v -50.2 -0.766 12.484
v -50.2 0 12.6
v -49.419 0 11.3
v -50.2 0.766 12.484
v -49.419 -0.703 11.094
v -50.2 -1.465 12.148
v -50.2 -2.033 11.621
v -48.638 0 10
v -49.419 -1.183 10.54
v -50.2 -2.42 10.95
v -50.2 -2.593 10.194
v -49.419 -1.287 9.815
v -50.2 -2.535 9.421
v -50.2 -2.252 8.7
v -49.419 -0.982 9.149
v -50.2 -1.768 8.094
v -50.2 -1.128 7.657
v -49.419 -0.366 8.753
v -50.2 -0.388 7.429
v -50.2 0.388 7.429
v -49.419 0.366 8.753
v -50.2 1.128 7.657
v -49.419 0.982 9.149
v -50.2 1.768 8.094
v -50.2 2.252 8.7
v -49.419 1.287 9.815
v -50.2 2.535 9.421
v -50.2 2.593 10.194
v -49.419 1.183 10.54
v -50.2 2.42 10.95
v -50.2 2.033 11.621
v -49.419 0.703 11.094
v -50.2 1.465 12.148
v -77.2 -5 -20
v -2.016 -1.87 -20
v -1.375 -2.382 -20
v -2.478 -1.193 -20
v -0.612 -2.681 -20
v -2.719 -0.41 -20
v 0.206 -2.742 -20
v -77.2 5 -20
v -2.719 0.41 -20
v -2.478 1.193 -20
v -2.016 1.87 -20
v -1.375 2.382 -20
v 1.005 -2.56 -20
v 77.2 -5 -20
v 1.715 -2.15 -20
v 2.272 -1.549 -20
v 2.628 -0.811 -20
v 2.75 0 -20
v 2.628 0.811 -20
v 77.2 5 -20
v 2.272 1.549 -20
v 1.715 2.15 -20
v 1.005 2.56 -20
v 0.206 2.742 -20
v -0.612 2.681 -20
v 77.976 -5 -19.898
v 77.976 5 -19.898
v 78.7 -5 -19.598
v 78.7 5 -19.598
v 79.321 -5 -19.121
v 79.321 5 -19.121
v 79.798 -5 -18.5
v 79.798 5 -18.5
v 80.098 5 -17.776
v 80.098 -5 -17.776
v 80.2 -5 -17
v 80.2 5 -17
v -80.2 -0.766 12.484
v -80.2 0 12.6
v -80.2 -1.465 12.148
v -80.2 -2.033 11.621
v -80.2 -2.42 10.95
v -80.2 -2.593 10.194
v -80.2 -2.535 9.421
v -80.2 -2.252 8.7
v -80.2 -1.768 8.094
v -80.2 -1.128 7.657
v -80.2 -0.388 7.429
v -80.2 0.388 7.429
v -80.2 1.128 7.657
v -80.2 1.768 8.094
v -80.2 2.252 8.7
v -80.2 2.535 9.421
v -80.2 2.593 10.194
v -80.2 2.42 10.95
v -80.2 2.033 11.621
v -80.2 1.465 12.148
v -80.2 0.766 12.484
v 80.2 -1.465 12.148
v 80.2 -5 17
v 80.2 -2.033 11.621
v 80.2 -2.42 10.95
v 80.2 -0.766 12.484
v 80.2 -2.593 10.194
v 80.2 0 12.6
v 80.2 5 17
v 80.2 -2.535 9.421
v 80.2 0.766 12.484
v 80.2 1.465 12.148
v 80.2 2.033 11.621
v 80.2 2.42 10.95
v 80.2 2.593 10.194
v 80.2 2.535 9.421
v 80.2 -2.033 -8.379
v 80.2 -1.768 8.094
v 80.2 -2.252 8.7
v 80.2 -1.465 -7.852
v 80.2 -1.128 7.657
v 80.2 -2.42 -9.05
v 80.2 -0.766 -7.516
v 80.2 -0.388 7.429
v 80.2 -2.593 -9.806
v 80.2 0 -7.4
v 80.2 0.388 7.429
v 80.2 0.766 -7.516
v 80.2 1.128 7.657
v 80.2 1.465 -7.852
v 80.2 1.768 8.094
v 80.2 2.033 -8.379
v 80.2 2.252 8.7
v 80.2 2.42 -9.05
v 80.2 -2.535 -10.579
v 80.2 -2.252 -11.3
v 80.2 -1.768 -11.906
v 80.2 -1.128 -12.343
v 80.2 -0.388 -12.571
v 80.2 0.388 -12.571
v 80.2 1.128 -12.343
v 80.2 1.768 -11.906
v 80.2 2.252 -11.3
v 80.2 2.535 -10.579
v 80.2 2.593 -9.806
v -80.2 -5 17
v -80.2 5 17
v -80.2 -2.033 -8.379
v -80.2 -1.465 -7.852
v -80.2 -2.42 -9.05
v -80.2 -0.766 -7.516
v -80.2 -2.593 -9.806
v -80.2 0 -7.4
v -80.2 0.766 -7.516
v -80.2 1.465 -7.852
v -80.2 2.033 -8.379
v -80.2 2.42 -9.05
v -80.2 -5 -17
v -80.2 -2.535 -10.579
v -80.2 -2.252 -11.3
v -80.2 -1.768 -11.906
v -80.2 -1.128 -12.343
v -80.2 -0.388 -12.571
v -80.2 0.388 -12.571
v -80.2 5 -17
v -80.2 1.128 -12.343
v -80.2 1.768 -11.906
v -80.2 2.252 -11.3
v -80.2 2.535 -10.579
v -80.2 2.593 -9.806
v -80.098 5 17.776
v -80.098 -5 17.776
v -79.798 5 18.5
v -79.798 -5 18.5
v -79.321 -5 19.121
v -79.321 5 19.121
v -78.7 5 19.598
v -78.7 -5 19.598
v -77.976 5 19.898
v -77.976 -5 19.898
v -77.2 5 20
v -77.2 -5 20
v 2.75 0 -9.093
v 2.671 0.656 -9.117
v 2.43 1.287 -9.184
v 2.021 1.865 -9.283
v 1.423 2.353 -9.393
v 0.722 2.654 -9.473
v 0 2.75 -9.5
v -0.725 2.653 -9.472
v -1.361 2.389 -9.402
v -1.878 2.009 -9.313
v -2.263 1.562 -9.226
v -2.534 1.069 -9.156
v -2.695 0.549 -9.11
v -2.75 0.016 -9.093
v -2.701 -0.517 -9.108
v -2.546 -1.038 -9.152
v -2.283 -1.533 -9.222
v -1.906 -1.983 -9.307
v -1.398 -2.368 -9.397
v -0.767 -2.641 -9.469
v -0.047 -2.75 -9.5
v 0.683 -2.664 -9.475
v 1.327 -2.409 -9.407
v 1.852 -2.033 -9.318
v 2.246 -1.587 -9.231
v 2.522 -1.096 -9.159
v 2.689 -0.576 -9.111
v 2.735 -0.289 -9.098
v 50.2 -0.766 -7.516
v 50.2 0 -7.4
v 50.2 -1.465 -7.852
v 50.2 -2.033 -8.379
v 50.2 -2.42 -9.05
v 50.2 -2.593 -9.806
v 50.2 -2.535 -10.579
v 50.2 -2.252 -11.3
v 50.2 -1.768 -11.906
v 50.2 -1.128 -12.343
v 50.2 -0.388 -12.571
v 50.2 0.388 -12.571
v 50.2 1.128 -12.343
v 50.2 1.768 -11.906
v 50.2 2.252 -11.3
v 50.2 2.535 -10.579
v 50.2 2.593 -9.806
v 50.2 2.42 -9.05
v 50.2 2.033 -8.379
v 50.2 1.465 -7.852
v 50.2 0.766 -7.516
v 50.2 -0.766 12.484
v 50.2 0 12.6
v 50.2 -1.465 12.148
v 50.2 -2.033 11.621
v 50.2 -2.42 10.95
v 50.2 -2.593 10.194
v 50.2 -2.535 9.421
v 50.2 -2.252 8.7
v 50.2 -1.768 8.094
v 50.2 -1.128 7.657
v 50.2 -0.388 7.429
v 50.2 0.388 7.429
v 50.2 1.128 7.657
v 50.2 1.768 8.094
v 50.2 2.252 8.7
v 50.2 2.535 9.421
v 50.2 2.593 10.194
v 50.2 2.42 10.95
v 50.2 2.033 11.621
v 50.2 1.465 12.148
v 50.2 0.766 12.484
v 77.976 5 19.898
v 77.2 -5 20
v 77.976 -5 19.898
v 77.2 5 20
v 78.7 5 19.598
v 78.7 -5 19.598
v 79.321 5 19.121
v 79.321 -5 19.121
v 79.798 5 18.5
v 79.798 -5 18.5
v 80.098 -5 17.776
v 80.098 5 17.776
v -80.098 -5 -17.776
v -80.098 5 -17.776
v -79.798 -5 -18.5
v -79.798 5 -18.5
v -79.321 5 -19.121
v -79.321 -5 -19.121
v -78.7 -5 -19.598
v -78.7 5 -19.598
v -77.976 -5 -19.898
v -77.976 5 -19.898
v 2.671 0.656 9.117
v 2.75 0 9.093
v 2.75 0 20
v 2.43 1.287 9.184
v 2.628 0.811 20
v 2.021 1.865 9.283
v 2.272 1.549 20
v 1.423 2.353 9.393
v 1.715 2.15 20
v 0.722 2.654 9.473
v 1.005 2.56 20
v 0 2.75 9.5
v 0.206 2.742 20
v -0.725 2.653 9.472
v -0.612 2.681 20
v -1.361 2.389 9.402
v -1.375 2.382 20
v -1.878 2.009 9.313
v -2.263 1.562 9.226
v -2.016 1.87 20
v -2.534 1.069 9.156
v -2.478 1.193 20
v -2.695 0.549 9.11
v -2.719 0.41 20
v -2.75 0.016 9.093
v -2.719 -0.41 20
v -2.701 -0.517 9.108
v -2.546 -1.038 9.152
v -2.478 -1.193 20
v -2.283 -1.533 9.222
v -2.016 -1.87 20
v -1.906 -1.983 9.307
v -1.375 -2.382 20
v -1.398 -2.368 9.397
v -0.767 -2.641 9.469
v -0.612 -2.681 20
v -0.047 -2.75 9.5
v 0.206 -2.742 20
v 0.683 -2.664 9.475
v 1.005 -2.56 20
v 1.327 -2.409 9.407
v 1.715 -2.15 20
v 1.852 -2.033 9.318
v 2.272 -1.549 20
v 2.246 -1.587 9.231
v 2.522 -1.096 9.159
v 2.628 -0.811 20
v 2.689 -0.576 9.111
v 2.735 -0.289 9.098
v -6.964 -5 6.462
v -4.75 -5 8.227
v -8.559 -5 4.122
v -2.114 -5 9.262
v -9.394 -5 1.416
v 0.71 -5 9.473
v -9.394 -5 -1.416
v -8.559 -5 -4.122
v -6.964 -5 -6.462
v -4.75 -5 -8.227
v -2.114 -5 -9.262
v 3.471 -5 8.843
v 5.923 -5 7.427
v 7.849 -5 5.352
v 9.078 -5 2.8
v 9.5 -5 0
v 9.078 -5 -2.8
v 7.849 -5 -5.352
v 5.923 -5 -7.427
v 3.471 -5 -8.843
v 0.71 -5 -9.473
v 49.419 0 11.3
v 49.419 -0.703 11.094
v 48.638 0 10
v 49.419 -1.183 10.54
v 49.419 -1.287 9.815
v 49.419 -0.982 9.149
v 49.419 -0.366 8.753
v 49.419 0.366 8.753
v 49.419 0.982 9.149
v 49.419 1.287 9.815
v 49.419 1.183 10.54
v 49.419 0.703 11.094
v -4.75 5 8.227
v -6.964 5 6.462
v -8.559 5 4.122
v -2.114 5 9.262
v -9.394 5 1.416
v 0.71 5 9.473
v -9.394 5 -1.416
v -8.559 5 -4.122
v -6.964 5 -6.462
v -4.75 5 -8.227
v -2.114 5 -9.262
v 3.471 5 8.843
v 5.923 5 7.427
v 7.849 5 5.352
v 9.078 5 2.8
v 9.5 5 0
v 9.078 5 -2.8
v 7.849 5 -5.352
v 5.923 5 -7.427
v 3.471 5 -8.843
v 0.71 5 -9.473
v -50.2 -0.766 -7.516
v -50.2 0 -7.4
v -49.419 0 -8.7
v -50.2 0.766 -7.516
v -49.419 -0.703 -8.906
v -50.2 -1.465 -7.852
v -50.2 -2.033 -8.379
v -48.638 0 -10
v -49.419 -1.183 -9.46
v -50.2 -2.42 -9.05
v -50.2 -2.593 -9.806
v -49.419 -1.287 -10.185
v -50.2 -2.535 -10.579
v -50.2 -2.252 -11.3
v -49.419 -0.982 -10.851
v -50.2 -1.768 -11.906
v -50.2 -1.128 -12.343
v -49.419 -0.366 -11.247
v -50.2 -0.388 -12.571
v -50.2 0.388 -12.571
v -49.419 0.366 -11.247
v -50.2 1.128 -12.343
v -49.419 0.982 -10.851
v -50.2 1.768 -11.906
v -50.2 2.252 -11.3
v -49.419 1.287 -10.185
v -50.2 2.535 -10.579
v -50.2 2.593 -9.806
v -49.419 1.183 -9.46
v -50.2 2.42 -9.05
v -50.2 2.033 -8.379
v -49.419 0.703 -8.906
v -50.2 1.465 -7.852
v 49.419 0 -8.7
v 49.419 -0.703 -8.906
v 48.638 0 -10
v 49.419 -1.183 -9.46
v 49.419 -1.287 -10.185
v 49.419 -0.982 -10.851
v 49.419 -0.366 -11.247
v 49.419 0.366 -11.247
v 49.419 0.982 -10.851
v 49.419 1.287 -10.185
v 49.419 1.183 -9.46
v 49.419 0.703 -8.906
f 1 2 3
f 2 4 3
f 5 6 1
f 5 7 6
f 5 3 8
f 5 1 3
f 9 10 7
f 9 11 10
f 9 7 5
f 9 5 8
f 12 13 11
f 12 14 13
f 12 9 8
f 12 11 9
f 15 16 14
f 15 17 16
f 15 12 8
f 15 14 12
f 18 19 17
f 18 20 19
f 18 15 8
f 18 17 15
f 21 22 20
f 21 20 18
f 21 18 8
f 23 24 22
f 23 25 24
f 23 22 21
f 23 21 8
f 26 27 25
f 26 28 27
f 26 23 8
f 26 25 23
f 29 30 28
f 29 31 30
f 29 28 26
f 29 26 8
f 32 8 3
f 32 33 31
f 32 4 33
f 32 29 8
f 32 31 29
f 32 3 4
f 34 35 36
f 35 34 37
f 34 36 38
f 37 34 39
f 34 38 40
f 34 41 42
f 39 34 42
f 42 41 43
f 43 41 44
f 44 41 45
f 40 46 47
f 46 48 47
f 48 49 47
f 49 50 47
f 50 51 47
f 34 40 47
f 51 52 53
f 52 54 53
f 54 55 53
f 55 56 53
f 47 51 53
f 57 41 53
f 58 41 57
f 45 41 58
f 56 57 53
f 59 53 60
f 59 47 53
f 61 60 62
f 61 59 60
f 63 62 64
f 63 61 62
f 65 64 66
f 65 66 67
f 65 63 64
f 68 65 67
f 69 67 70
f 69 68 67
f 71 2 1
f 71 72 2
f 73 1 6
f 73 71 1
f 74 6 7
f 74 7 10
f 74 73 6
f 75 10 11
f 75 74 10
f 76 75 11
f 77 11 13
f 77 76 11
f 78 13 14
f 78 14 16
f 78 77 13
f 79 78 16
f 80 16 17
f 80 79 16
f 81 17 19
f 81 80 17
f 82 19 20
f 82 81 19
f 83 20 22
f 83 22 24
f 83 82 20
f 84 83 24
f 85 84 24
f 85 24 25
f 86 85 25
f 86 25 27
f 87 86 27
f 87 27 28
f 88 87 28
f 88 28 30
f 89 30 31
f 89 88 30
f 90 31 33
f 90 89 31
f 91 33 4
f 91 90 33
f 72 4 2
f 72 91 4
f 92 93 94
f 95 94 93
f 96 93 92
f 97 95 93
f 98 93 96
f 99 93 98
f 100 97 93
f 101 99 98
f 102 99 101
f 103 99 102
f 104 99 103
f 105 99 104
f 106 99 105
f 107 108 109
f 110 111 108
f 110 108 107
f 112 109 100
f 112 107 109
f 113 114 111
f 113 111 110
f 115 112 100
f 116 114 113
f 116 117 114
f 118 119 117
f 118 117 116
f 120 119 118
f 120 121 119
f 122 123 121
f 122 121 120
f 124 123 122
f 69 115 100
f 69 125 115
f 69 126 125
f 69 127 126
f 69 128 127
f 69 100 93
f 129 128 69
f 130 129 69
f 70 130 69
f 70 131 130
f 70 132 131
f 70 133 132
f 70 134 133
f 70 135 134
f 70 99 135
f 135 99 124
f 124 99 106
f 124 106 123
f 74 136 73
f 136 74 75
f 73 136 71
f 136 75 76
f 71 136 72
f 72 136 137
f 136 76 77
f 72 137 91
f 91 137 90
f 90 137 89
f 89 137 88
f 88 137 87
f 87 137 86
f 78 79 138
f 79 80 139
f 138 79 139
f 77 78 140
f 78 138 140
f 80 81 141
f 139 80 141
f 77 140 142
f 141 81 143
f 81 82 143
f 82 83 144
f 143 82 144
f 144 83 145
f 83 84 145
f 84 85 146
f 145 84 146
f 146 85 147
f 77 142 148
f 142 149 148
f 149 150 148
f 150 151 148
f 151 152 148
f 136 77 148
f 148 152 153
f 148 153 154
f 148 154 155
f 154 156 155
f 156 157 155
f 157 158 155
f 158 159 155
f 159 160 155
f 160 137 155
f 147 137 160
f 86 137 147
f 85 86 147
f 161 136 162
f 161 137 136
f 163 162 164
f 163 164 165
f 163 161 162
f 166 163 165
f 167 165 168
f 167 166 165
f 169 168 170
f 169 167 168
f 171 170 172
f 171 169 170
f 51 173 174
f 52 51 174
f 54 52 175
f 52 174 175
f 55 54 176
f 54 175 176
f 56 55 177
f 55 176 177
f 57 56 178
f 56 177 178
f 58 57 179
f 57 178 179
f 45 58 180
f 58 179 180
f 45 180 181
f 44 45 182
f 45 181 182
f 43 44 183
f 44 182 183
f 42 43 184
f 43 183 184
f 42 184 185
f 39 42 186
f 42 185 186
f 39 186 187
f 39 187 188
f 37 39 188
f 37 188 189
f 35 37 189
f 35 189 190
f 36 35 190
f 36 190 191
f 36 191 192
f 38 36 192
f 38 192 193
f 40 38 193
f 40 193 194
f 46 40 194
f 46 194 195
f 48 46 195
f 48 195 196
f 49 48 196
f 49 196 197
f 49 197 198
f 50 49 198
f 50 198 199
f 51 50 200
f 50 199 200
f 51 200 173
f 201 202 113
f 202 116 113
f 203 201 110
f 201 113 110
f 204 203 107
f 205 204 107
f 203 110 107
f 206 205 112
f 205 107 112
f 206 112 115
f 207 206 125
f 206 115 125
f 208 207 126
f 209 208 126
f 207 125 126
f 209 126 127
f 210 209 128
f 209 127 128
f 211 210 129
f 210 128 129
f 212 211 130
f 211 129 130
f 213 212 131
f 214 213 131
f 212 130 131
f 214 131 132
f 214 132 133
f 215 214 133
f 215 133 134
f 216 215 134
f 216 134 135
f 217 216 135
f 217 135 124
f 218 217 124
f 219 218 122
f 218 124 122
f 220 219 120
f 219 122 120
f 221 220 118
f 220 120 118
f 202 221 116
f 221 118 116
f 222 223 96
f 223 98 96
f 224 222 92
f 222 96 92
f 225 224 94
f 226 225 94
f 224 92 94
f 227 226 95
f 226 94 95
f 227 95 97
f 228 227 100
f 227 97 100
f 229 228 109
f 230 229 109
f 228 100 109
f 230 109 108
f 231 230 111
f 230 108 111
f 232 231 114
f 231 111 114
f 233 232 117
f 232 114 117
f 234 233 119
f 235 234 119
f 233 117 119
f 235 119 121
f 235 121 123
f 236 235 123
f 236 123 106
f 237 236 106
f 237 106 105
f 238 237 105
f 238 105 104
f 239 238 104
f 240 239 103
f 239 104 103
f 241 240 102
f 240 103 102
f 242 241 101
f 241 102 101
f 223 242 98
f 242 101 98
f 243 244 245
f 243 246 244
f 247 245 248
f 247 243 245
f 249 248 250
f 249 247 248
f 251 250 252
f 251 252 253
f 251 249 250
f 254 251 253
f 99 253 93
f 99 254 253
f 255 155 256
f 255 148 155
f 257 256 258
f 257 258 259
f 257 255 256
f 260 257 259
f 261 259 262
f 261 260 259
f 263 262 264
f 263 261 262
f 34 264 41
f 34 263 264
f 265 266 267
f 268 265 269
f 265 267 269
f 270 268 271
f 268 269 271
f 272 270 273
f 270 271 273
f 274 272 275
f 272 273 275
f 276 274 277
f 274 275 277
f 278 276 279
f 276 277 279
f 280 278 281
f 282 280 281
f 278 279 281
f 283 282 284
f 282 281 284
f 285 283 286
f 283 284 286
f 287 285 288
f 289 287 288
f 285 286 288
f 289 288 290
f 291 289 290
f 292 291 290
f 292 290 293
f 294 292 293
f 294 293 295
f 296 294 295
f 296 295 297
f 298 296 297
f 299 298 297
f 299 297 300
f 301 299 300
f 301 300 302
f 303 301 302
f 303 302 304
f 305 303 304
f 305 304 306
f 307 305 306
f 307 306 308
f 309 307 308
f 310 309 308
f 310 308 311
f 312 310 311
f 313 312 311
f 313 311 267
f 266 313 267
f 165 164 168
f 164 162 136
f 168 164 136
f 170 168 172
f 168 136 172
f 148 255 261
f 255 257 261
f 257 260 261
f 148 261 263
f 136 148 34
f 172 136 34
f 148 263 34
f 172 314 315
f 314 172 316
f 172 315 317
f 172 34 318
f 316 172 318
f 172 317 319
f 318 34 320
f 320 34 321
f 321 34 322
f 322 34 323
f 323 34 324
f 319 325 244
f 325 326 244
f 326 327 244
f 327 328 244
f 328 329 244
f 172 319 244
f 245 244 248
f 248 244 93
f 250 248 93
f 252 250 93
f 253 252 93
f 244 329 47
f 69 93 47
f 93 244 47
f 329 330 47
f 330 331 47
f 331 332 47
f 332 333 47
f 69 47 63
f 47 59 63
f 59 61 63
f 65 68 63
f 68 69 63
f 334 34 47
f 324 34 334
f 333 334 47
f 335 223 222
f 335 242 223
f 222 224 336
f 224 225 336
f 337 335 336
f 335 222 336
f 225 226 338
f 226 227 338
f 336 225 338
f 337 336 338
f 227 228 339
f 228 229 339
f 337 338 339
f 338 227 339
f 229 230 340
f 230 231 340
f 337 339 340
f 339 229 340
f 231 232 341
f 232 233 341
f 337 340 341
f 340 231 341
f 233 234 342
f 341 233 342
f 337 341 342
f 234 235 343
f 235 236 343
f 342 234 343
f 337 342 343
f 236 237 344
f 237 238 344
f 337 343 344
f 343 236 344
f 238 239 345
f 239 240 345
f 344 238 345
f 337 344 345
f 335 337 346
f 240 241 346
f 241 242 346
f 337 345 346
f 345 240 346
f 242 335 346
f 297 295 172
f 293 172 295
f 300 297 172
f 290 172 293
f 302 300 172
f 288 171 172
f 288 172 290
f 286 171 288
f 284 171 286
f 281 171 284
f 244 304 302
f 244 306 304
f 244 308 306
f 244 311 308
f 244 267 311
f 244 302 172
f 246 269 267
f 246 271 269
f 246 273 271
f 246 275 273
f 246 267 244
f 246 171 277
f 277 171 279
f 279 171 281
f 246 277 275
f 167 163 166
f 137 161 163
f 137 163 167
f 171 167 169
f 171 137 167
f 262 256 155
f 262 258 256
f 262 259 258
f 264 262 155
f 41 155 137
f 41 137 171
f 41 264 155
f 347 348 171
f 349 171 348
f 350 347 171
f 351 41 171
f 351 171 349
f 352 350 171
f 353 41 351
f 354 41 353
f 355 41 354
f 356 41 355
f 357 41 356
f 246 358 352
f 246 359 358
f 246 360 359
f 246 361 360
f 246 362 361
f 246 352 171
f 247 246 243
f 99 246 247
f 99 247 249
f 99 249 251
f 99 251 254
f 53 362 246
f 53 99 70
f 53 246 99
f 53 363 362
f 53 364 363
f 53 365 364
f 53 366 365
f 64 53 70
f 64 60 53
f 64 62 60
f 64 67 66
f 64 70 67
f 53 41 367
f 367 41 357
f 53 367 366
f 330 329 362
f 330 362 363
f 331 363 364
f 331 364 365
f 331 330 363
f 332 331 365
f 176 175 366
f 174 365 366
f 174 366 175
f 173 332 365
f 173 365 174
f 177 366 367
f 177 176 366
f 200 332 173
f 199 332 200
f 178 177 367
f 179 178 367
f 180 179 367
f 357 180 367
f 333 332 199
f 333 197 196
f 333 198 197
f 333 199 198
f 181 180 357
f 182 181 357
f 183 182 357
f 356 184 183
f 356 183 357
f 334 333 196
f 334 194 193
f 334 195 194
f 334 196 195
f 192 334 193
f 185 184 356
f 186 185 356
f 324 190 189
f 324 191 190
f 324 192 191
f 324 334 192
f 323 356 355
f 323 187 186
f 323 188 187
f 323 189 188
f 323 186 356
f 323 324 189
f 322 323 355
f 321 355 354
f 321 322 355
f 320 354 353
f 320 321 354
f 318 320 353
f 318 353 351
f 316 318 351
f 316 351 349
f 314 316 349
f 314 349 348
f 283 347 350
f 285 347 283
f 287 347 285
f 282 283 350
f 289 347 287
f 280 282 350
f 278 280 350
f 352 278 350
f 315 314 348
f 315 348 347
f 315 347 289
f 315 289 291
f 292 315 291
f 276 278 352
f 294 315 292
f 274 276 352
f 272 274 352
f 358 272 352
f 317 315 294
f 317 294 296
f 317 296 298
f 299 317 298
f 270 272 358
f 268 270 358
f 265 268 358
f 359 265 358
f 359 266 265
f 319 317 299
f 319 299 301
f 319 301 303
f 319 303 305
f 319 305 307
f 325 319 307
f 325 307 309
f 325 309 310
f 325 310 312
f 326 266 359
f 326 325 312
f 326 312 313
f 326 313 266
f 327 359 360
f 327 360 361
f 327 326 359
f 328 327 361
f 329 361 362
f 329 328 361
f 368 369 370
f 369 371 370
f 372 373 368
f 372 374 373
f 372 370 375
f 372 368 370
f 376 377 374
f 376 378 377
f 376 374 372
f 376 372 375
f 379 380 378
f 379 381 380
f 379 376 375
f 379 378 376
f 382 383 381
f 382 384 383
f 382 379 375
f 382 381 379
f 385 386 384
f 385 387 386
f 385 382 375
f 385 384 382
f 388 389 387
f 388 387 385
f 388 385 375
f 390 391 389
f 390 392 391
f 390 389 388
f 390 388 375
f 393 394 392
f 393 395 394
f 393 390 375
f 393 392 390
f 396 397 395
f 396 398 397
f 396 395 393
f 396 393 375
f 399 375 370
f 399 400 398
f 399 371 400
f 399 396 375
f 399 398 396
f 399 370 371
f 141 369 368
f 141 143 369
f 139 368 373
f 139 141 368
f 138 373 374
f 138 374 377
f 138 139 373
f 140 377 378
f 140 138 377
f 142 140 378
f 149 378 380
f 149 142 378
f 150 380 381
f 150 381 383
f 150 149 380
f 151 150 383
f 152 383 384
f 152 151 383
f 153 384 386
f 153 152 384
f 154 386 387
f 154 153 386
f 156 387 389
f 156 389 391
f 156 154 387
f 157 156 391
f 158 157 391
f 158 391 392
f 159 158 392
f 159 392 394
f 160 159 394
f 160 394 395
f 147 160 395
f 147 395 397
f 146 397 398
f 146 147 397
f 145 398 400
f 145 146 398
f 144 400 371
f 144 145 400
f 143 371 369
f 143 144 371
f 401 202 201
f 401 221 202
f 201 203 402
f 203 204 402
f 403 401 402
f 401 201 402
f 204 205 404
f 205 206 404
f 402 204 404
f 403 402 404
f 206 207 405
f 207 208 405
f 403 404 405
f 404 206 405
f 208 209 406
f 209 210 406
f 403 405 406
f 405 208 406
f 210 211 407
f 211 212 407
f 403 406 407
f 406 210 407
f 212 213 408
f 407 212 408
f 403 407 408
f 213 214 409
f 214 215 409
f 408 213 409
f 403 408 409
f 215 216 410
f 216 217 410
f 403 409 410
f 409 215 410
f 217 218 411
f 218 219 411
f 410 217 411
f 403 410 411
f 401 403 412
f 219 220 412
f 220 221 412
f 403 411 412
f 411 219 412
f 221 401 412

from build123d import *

# Parameters (mm, degrees)
SKETCH1_W                             = 160.4
SKETCH1_H                             = 40
SKETCH1_R                             = 9.5
BOSS_EXTRUDE1_DEPTH                   = 5
TAP_DRILL_FOR_M5_HELICOIL1_AT_2_COUNT = 2
TAP_DRILL_FOR_M5_HELICOIL1_AT_2_PITCH = 20
FILLET1_R                             = 3
M5_CLEARANCE_HOLE1_D                  = 5.5


with BuildPart() as part:
    # Sketch1 → Boss-Extrude1 (new body, symmetric)
    with BuildSketch(Plane(origin=(0, 0, 0), x_dir=(1, 0, 0), z_dir=(0, 1, 0))):
        Rectangle(SKETCH1_W, SKETCH1_H)
        Circle(SKETCH1_R, mode=Mode.SUBTRACT)
    extrude(amount=BOSS_EXTRUDE1_DEPTH, both=True)

    # Sketch4 → Tap Drill for M5 Helicoil1 (revolve, cut)
    with BuildSketch(Plane(origin=(-80.2, 0, -10), x_dir=(0, 0, 1), z_dir=(0, 1, 0))):
        Polygon((0, 0), (0, 31.562237609), (2.6, 30), (2.6, 0), align=None)
    tap_drill_for_m5_helicoil1 = revolve(axis=Axis((-86.55, 0, -10), (1, 0, 0)), mode=Mode.SUBTRACT)

    # Tap Drill for M5 Helicoil1 at 2: Tap Drill for M5 Helicoil1 ×2
    with Locations(*[(0, 0, i * TAP_DRILL_FOR_M5_HELICOIL1_AT_2_PITCH) for i in range(1, TAP_DRILL_FOR_M5_HELICOIL1_AT_2_COUNT)]):
        add(tap_drill_for_m5_helicoil1, mode=Mode.SUBTRACT)

    # Mirror1: Tap Drill for M5 Helicoil1 across plane
    add(tap_drill_for_m5_helicoil1.mirror(Plane(origin=(0, 0, 0), x_dir=(0, 0, 1), z_dir=(1, 0, 0))), mode=Mode.SUBTRACT)

    # Mirror1 copy 1 sketch → Mirror1 copy 1 (revolve, cut)
    with BuildSketch(Plane(origin=(80.2, 0, 10), x_dir=(0, 0, 1), z_dir=(0, 1, 0))):
        Polygon((0, 0), (0, -31.562237609), (2.6, -30), (2.6, 0), align=None)
    revolve(axis=Axis((86.55, 0, 10), (1, 0, 0)), mode=Mode.SUBTRACT)

    # Fillet1
    fillet1_edges = [part.edges().sort_by_distance(p)[0] for p in [
        (-80.2, 0, -20),
        (80.2, 0, -20),
        (80.2, 0, 20),
        (-80.2, 0, 20),
    ]]
    fillet(fillet1_edges, radius=FILLET1_R)

    # M5 Clearance Hole1 (through all)
    with Locations(Plane(origin=(0, 0, -20), x_dir=(-1, 0, 0), z_dir=(0, 0, -1))):
        with Locations((0, 0)):
            Hole(M5_CLEARANCE_HOLE1_D / 2)


solid = part.part
